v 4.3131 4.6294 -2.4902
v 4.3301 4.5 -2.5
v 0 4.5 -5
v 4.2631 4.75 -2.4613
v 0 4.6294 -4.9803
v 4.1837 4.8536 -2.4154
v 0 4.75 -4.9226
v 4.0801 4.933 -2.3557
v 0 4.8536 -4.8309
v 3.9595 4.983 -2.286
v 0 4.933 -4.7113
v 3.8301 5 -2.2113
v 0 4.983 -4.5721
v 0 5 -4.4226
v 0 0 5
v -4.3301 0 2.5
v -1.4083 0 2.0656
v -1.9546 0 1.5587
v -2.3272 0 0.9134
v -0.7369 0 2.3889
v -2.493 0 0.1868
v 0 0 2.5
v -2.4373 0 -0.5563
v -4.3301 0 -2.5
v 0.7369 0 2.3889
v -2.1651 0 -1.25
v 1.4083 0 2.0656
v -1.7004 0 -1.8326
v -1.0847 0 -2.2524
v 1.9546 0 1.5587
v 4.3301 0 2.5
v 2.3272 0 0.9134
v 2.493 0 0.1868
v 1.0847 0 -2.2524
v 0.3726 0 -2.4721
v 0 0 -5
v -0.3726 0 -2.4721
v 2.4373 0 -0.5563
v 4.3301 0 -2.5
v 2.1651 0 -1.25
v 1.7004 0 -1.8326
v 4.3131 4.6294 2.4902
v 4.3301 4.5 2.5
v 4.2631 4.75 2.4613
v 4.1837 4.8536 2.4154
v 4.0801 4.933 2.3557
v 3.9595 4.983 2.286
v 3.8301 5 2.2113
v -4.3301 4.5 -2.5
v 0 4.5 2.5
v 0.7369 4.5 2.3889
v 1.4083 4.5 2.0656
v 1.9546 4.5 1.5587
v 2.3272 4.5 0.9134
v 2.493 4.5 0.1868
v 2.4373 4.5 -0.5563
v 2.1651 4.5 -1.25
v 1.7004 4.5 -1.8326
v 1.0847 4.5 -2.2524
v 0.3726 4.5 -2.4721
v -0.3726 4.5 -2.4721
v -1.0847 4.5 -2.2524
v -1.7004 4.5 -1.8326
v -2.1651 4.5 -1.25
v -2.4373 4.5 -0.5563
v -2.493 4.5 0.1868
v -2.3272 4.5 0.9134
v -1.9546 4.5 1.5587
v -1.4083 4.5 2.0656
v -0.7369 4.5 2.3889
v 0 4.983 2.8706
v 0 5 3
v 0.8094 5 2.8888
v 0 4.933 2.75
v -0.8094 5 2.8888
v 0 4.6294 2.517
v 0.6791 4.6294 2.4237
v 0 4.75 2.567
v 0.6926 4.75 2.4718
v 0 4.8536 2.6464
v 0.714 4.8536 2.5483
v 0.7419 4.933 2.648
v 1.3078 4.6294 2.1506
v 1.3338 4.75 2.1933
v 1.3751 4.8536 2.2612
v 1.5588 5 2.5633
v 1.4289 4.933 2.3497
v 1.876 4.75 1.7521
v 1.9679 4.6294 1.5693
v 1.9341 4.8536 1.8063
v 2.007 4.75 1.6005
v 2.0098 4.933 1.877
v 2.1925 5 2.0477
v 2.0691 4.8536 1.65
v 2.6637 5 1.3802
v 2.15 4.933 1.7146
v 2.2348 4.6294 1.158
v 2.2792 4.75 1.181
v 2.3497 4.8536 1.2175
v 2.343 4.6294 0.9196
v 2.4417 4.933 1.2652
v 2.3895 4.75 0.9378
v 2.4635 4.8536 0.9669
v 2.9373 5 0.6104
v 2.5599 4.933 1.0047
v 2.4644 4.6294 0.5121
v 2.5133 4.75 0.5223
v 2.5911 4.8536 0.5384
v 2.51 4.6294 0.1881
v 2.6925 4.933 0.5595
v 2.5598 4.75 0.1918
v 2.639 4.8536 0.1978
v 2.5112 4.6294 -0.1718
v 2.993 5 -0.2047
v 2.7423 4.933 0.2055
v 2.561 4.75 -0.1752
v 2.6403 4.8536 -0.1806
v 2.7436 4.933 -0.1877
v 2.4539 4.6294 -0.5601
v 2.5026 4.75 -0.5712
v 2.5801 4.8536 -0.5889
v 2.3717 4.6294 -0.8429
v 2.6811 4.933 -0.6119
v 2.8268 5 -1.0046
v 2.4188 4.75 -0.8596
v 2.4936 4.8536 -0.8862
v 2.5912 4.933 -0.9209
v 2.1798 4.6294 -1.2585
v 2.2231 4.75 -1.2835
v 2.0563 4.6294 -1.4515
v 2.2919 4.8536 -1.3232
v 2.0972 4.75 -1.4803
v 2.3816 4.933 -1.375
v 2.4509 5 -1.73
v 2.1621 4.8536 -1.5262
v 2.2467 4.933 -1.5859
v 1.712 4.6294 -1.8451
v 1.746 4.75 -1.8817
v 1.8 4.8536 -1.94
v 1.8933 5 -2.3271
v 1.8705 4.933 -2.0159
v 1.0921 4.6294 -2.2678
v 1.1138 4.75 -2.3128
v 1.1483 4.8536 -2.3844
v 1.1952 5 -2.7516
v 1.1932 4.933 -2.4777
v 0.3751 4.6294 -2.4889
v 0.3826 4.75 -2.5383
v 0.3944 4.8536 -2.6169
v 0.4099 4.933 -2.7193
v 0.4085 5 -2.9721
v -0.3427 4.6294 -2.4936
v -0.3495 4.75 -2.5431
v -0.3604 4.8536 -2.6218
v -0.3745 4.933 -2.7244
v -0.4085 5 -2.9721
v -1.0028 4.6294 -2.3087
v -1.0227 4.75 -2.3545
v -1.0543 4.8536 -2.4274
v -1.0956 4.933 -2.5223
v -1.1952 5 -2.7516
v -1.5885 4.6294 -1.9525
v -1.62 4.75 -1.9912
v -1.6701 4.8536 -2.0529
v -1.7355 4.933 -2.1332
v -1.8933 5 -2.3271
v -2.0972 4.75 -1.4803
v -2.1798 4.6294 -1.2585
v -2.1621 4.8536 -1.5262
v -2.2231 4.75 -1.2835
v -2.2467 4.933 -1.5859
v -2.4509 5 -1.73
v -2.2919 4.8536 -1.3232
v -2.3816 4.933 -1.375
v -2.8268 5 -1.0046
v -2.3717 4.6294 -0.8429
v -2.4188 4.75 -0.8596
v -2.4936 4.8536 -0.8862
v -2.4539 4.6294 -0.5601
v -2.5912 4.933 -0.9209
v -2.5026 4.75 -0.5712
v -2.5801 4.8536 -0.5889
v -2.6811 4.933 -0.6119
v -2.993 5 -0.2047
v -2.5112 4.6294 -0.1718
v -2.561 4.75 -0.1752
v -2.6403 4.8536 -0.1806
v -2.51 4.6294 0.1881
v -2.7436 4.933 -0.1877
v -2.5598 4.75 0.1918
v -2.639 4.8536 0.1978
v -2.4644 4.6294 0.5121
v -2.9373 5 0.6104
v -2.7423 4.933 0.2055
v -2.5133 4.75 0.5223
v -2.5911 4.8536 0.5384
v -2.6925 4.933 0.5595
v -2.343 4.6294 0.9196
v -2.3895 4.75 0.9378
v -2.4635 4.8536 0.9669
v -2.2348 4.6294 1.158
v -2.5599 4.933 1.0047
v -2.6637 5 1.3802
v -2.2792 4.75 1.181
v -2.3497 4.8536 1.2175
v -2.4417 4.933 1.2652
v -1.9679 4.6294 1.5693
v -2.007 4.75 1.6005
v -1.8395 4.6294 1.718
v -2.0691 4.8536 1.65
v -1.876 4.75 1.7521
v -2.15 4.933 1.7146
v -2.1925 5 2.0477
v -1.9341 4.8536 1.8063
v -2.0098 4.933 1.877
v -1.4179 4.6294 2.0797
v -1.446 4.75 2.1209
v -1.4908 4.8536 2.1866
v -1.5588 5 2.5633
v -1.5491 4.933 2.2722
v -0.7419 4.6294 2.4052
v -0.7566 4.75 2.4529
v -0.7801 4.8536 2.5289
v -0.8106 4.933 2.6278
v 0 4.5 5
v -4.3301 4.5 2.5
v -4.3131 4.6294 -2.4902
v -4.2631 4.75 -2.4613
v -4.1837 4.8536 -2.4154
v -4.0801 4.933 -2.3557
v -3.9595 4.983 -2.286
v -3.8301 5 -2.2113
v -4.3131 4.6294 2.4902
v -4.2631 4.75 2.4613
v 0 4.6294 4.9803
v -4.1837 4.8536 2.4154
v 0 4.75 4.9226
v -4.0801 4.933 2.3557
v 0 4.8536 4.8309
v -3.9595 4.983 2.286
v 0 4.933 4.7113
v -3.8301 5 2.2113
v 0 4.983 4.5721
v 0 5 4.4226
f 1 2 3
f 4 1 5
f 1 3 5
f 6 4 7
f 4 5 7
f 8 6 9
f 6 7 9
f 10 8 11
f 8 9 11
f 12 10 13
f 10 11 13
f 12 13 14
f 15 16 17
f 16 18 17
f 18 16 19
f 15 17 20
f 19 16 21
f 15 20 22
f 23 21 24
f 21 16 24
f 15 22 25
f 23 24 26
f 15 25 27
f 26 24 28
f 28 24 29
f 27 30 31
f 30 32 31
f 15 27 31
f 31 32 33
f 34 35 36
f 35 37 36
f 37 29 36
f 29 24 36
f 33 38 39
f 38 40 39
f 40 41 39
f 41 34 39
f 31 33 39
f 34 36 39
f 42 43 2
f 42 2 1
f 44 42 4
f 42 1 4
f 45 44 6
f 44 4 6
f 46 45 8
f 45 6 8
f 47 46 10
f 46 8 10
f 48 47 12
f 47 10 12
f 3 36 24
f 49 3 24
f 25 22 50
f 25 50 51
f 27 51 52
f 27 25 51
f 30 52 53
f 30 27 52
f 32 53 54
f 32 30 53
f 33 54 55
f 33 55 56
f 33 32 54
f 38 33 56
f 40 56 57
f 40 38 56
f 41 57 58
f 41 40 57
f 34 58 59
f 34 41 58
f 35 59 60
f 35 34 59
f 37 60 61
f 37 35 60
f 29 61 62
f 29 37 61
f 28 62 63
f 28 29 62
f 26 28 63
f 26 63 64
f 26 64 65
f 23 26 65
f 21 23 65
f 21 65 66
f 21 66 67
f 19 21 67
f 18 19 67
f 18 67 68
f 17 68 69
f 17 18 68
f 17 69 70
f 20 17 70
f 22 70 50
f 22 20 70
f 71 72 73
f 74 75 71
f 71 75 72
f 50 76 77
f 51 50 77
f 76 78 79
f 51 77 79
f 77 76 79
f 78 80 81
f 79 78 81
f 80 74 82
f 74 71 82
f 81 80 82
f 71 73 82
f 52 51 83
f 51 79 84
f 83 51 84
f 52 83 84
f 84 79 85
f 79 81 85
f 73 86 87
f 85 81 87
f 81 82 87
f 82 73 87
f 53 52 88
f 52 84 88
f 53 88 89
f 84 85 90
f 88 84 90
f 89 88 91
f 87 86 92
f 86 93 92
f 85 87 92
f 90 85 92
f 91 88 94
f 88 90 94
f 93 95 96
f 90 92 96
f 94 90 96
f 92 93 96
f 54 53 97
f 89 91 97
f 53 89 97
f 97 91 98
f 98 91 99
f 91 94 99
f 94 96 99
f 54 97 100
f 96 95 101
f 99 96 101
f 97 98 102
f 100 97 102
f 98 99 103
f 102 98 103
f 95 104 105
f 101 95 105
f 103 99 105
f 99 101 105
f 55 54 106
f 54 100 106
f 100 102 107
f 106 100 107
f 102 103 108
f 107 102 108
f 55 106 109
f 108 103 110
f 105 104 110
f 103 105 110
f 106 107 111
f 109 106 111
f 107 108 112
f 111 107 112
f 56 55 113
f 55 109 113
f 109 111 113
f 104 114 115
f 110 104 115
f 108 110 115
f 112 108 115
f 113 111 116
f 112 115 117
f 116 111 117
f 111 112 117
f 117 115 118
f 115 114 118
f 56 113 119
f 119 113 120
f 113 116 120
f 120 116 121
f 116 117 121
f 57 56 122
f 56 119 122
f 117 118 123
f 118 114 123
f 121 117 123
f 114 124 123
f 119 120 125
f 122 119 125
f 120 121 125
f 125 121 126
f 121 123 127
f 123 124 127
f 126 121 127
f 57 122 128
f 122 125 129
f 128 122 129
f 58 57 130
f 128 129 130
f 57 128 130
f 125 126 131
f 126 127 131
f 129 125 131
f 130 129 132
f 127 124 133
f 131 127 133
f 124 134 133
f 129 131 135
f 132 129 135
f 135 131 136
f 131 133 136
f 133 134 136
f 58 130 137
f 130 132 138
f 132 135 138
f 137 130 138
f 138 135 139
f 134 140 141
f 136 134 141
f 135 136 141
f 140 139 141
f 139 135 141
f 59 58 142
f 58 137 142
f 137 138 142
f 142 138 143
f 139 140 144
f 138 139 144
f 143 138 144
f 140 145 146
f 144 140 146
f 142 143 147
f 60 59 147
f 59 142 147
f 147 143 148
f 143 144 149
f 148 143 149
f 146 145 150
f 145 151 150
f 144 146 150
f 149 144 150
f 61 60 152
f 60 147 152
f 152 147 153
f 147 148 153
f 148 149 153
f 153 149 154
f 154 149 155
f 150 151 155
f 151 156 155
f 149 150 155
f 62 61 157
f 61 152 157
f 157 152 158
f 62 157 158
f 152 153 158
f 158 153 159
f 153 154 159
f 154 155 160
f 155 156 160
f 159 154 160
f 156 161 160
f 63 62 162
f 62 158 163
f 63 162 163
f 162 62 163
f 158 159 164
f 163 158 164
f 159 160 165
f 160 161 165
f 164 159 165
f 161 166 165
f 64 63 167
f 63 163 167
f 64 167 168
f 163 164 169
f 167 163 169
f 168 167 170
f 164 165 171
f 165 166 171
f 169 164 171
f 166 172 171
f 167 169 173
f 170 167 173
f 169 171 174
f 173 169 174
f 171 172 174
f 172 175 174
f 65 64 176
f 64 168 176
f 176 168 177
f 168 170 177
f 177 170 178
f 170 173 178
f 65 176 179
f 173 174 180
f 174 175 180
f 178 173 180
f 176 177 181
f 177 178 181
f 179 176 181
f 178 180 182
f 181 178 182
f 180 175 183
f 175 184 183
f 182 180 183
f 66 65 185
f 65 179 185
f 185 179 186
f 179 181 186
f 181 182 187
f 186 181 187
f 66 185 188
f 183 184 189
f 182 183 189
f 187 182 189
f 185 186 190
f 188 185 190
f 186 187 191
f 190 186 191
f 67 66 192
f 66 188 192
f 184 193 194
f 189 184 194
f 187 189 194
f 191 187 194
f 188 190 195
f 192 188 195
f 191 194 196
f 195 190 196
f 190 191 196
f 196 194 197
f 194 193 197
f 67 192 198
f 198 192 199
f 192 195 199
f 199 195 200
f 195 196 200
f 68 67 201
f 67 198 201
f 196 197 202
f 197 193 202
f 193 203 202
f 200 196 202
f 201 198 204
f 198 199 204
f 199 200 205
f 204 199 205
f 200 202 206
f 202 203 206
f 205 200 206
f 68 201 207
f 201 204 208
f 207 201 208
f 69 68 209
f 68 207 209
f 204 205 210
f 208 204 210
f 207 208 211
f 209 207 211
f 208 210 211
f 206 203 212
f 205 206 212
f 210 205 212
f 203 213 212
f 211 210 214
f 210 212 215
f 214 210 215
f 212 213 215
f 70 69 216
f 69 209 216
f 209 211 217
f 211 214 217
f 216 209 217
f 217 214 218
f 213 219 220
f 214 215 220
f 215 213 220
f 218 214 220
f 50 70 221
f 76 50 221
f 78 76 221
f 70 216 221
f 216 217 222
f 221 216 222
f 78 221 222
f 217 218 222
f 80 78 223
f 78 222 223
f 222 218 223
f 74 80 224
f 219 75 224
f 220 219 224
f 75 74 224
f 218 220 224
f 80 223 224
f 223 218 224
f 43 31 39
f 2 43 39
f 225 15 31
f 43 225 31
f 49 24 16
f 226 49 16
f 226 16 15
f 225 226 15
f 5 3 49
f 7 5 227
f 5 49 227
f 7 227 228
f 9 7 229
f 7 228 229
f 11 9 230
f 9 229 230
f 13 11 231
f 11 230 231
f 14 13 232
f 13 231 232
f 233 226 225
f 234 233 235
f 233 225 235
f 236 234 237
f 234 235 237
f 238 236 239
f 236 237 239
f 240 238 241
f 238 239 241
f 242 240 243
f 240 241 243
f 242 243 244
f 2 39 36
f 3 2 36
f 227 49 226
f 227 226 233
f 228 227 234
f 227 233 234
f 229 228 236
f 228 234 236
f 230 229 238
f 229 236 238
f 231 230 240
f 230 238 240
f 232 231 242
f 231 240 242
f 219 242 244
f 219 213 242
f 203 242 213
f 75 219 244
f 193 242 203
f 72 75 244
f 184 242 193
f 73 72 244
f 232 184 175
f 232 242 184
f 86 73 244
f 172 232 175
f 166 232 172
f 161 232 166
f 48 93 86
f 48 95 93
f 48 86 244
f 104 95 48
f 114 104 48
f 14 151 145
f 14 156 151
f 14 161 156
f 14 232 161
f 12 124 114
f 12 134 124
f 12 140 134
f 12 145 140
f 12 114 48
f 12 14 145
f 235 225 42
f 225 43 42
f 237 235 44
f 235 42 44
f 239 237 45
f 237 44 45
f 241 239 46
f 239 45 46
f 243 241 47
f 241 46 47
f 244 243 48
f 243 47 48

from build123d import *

# Parameters (mm, degrees)
SKETCH1_R           = 2.5
BOSS_EXTRUDE1_DEPTH = 5
FILLET1_R           = 0.5


with BuildPart() as part:
    # Sketch1 → Boss-Extrude1 (new body)
    with BuildSketch(Plane(origin=(0, 0, 0), x_dir=(1, 0, 0), z_dir=(0, 1, 0))):
        Polygon((0, 5), (-4.330127019, 2.5), (-4.330127019, -2.5), (0, -5), (4.330127019, -2.5), (4.330127019, 2.5), align=None)
        with Locations(Location((0, 0, 0), (0, 0, 270))):
            Circle(SKETCH1_R, mode=Mode.SUBTRACT)
    extrude(amount=BOSS_EXTRUDE1_DEPTH)

    # Fillet1
    fillet1_edges = [part.edges().sort_by_distance(p)[0] for p in [
        (-4.330127019, 5, 0),
        (-2.165063509, 5, 3.75),
        (2.165063509, 5, 3.75),
        (0, 5, -2.5),
        (4.330127019, 5, 0),
        (2.165063509, 5, -3.75),
        (-2.165063509, 5, -3.75),
    ]]
    fillet(fillet1_edges, radius=FILLET1_R)


solid = part.part
